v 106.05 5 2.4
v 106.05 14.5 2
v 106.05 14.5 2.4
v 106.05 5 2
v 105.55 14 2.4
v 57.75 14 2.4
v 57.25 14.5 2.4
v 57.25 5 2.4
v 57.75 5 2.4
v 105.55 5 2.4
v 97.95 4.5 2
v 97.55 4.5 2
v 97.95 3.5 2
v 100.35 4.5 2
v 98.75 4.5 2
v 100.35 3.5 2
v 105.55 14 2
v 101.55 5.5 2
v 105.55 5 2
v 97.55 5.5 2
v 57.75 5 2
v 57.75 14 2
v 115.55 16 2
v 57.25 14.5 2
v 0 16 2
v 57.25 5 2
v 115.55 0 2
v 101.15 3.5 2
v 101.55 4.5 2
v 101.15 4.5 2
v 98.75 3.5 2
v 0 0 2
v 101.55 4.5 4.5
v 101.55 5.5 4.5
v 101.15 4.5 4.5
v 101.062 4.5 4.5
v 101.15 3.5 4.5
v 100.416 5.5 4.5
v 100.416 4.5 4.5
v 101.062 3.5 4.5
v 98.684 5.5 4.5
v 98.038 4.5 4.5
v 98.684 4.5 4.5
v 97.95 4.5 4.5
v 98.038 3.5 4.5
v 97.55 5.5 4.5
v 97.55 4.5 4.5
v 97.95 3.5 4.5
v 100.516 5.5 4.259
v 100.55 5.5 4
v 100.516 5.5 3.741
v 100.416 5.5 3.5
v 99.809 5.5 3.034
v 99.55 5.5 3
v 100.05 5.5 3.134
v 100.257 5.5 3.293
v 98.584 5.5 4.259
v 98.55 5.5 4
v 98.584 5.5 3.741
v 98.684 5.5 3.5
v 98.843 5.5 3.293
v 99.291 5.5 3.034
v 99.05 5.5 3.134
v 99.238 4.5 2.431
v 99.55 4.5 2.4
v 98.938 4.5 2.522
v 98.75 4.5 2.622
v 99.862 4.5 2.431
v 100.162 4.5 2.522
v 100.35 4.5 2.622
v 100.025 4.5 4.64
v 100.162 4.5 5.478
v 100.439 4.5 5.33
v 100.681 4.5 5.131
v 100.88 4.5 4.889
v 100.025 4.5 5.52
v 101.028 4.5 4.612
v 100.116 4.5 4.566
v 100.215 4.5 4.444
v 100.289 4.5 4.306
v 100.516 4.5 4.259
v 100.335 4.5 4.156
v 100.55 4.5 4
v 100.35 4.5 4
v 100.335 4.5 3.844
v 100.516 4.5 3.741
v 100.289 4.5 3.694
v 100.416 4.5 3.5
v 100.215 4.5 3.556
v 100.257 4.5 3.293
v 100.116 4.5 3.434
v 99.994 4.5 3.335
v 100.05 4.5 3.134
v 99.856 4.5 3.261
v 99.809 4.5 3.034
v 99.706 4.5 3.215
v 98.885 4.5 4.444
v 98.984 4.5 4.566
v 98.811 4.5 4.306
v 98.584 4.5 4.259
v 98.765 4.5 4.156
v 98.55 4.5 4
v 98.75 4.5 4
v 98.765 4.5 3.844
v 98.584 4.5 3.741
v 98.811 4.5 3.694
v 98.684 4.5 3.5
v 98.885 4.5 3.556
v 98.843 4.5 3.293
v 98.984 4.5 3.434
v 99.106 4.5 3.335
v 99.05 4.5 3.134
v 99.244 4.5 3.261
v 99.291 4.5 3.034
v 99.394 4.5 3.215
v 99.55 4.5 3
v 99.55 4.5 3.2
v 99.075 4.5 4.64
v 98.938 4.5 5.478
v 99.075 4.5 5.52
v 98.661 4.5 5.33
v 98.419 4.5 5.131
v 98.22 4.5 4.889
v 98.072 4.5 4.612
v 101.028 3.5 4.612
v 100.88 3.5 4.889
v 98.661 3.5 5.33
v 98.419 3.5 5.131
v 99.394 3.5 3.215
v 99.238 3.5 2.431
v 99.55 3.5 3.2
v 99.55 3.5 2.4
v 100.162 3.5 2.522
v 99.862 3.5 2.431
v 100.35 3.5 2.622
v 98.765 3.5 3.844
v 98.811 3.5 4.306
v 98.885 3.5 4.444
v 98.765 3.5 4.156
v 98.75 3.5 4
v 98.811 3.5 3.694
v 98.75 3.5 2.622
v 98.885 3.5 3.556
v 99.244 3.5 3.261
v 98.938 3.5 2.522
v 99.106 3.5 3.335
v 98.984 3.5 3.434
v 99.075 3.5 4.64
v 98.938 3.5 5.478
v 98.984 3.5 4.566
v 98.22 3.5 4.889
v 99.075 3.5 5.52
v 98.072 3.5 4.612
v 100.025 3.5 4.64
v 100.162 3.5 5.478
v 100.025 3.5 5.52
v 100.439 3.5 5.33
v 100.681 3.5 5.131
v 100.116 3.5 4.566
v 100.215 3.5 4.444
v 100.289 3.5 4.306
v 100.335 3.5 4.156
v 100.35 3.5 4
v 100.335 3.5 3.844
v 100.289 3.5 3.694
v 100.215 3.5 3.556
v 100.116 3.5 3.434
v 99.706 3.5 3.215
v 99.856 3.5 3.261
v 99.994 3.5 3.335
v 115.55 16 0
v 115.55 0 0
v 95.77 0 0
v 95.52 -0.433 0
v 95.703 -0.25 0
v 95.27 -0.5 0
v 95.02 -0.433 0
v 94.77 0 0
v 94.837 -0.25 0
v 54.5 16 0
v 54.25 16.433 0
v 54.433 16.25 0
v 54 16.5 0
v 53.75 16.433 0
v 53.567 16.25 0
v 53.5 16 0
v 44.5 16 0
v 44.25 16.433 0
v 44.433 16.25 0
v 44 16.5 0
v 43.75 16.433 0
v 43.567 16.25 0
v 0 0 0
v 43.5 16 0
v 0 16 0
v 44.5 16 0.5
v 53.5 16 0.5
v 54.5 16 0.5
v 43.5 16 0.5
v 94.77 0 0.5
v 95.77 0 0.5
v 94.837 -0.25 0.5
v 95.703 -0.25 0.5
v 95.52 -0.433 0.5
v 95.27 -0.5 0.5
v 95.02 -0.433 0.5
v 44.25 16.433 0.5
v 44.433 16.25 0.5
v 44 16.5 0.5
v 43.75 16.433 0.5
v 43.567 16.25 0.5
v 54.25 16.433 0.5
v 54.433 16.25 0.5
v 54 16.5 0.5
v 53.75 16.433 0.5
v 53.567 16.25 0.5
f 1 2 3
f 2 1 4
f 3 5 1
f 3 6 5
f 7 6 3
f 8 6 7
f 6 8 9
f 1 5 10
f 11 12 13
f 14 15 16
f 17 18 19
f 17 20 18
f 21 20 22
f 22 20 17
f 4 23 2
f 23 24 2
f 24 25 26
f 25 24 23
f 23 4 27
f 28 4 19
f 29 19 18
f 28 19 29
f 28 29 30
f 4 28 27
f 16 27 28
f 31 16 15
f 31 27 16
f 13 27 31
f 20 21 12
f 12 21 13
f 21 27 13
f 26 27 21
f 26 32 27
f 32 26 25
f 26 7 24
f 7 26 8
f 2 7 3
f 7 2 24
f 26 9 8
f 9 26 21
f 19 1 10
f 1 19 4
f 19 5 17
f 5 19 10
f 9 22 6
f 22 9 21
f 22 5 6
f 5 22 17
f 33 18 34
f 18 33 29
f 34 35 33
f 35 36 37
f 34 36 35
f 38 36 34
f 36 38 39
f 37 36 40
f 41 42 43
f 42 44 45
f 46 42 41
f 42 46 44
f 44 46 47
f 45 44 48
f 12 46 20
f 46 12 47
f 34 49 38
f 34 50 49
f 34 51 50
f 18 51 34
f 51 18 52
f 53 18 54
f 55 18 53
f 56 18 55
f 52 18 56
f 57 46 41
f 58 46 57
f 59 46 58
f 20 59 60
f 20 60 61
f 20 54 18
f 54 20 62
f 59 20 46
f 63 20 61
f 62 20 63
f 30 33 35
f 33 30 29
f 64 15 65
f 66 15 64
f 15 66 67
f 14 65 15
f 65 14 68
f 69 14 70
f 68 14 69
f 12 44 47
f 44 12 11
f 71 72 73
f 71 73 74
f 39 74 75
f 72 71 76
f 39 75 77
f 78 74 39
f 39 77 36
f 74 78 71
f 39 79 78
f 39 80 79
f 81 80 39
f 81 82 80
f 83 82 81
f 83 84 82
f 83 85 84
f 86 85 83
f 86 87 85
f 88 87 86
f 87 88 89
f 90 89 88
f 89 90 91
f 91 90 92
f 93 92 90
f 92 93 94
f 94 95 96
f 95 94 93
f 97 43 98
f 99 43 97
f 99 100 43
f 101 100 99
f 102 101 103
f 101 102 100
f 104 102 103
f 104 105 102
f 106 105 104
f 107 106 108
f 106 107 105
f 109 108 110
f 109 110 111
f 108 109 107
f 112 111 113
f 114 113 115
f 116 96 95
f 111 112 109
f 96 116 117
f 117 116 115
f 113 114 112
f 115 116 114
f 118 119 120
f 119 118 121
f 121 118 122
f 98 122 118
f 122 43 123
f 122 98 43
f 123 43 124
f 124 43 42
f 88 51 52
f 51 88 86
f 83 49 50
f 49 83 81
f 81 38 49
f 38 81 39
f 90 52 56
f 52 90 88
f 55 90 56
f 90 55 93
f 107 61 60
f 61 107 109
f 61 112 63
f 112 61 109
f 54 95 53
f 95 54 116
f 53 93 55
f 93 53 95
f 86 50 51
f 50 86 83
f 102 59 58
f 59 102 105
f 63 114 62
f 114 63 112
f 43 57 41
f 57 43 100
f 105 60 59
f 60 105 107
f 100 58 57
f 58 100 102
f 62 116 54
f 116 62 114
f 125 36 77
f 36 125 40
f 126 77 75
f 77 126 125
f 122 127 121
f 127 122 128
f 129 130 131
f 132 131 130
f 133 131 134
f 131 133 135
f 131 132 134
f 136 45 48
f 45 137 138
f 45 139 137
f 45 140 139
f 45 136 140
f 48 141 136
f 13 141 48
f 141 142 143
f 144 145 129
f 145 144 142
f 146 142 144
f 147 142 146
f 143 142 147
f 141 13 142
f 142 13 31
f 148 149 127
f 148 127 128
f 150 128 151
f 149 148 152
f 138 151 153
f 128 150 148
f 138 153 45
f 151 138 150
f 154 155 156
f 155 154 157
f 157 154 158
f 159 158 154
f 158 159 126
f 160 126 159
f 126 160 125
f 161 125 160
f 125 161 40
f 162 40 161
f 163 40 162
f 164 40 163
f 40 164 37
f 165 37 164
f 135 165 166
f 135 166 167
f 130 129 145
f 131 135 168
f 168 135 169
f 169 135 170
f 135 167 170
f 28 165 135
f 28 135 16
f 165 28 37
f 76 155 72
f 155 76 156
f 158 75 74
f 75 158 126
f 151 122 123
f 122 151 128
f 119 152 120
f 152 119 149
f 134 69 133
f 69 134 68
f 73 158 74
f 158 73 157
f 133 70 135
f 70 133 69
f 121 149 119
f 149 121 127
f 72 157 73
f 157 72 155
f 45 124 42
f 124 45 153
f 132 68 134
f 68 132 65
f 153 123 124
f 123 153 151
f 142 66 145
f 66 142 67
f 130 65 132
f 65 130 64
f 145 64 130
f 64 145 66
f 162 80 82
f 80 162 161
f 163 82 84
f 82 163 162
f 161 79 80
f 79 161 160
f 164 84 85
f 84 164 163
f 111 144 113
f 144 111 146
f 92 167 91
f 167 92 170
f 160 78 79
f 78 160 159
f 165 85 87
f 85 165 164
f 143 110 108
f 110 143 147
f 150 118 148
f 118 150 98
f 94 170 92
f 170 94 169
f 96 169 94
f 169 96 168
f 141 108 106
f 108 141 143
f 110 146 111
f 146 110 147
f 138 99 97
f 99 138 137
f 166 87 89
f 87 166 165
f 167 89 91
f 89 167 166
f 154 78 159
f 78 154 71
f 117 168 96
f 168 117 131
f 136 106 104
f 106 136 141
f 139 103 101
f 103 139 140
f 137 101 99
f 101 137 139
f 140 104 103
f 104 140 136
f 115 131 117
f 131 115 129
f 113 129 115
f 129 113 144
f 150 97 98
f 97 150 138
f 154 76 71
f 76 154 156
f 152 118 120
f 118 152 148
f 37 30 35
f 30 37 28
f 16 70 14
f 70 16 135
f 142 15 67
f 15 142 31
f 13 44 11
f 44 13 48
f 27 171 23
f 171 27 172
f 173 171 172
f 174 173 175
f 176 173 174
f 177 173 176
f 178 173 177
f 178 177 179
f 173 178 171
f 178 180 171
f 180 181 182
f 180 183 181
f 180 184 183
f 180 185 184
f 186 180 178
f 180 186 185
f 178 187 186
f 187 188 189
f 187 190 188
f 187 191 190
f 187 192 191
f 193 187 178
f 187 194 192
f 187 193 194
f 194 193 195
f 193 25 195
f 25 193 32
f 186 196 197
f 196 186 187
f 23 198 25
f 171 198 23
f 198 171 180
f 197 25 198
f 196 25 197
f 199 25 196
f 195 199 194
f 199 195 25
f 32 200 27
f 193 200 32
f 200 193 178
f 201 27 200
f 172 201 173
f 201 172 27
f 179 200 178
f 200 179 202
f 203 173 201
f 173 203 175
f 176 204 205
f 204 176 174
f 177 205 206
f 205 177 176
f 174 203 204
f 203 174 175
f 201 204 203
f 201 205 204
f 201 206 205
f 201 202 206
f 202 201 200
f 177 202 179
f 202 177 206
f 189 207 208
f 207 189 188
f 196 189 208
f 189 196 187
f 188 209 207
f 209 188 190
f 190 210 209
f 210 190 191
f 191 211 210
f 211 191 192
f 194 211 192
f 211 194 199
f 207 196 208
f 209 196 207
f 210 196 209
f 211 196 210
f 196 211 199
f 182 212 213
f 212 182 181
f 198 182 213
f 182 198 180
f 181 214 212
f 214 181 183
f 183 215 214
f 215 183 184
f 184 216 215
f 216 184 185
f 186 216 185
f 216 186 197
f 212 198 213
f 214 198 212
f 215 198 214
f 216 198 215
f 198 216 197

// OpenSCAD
// Internal mount for the adhesive U.FL 2.4GHz antenna (pilink-8hx.4).
//
// NOT RENDERED/FIT-CHECKED. OpenSCAD is not installed in the environment
// this file was authored (and later fixed) in (see README.md and
// AGENTS.md "This repo has no build/test automation") -- every dimension
// below is transcribed from a cited source or marked as this file's own
// assumption. A human with OpenSCAD (or a later pass with it installed)
// still needs to actually render this and check it against the real
// back-shell geometry from pilink-8hx.1, once that lands.
//
// Scope: this file models only the antenna mount feature itself (a flat
// adhesive-land + retention lip + cable strain relief + a reference cable
// channel), not a full top-wall shell. pilink-8hx.1 (back shell) and
// pilink-8hx.2 (front shell) are being built in parallel on separate
// branches and own the real top-wall geometry; antenna_mount() is meant to
// be instantiated (translated/rotated onto the real wall) from whichever of
// those ends up owning the top wall's inner surface. demo_assembly() below
// is a self-contained preview only -- its "stand-in top wall" slab is NOT
// the real enclosure wall and must not be unioned into either shell.
//
// Revision history: a code-reviewer's NOT APPROVED verdict on PR #48
// (2bdfd6a) found the first version's left-wall-hugging position put the
// antenna element physically inside the SW101 top-edge pinhole's channel
// (a real 3D collision, not just a flagged cross-bead conflict), never
// checked the display-panel/ground-plane clearance it claimed to derive,
// and had three geometry bugs (lip closed on the wrong side, the cable
// channel modeled as a solid bar instead of an actual cutout, and the
// strain-relief clip coming out U-shaped instead of C-shaped). That
// revision (9eac09f) re-derived the position (see "Mount position" below)
// and fixed those three bugs, but a second NOT APPROVED round found: the
// display/ground clearance discussion was framed on the wrong axis (a
// non-existent "Z gap" instead of the real face-Y distance) and wrongly
// called "not derivable" when it is derivable and fails the guidance; the
// land/lip/channel/clip stack was modeled ~19mm deep against a ~10mm
// available wall cavity; the strain-relief clip's bore ran wall-normal
// instead of along the cable's actual path; the cable-channel-width
// comment claimed margin for the IPEX plug body that doesn't mate here at
// all (it mates at U201, far from this stub); and a stated clearance
// figure had an arithmetic slip (39mm instead of 38.25mm). This revision
// fixes all of those -- see the comments at each fix below and
// `.planning` bead `pilink-58z` for the RF-clearance trade-off this file
// now surfaces instead of hiding.
//
// A third NOT APPROVED round (47e528d) found the strain-relief clip, as
// built after round 2, couldn't actually hold the cable: its snap-in slot
// (1.43mm) was wider than the 1.13mm coax it was meant to grip; its wall
// thickness was silently tied to LIP_WIDTH and had been thinned to 0.5mm
// along with it; it floated 0.7mm off the wall surface with no real
// support; and its slot opened sideways (-X) while the channel's own
// groove opens upward (+Z), a kink in the cable's path. This revision
// gives the slot its own under-the-coax width, gives the clip its own
// independent wall-thickness constant, adds support legs down to the
// wall surface, and reorients the slot to open the same way as the
// groove -- see strain_relief_clip() and the legs added just after its
// call site below. That round also found this file's own README wording
// overstated the ~46mm clearance figure's source as "the antenna
// datasheet's own guidance" -- fixed in README.md to match what this
// file already said (general adhesive-FPC-antenna practice, not a
// datasheet figure).

// pilink-3ym (2026-11-16) REVISION -- supersedes pilink-adt / closed PR #54.
// pilink-hdl (PR #60) moved U201 to the BACK of the board (B.Cu) and
// restored the A/B/X/Y diamond to centre (102,25). Consequences handled
// here: (1) U201 is no longer on the front, so it is not "under the mount";
// its U.FL faces the back shell and the pigtail runs behind the PCB, over
// the board's top edge, into this mount (route + length derived below);
// (2) the pigtail exit moved from the land's left end to its right end,
// nearest the back-side U.FL (face X ~101); (3) the stale diamond
// coordinates are gone (this file never used the diamond; the old
// pilink-2yw (102,34) figures only survive in history notes); (4) the
// board-to-face Y mapping now matches the shells' Qface = 52 - by (the old
// 6mm bottom-flush assumption was wrong by 2mm, which made the RF
// clearance numbers 2mm too generous). The antenna ELEMENT/mount X span
// (57.75-105.55) did not move, so pilink-58z's numbers only change through
// that mapping correction (4->2mm to the board top edge, 9->7mm to the
// panel frame), not through the PCB change. Still NOT rendered.

// ---------------------------------------------------------------------------
// Antenna part -- Kinghelm KH-FPC2.4G-1.13IPEX-240, LCSC C4943394. Selected
// (over the AIWF026 alternate) in
// .research/findings/2026-11-15-ufl-antenna-selection.md and closed out in
// bd pilink-8wx ("primary Kinghelm KH-FPC2.4G-1.13IPEX-240, alternate
// MyAntenna AIWF026 flagged as fractionally over cert-safe gain ceiling").
// ---------------------------------------------------------------------------

// Element footprint, confirmed directly on LCSC's C4943394 product page
// (packaging field "SMD, 45.8x6.5mm") per the research finding.
ANTENNA_ELEMENT_LENGTH = 45.8;   // mm, long axis
ANTENNA_ELEMENT_WIDTH  = 6.5;    // mm

// Element thickness is NOT given anywhere in the finding or on the LCSC
// listing -- this is this file's own nominal placeholder for a thin
// adhesive-backed FPC, used only so the 3D preview has a visible element;
// it is not a verified dimension and should not drive any clearance math.
ANTENNA_ELEMENT_THICKNESS_NOMINAL = 0.3; // mm, UNVERIFIED placeholder

// Pigtail: Ø1.13mm coax, IPEX/U.FL-class plug. The "-240" part-number
// suffix implies a 240mm cable but the finding is explicit this is
// INFERRED from the part number, not a confirmed datasheet/listing field
// -- confirm before ordering. Not used for any geometry below beyond the
// cable-channel's nominal width.
ANTENNA_CABLE_DIAMETER = 1.13; // mm

// Clearance guidance (.research/findings/2026-11-15-ufl-antenna-selection.md,
// "Clearance / ground-plane guidance"): the 32UE's own datasheet carries no
// keepout for an external antenna (that keepout only applied to the
// on-module antenna variant). The finding instead cites general adhesive-FPC
// practice: "keep the flexible element itself clear of metal/ground
// plane/battery within roughly its own element length on the radiating
// side". Modeled here as a single symmetric reference zone equal to the
// element's own length -- a simplification of what the source guidance
// describes as one-sided/radiating-direction-specific, since neither the
// finding nor any datasheet in this repo states which end of this specific
// part radiates. Shown with `%` (OpenSCAD non-manifold preview modifier) so
// it never affects a boolean/union result -- it is a visual "keep metal
// clear of this" marker for a human reviewing the render, not a solid.
ANTENNA_KEEPOUT_FROM_METAL = ANTENNA_ELEMENT_LENGTH; // mm, see note above

// ---------------------------------------------------------------------------
// Board / face coordinate assumptions.
//
// hardware/README.md "PCB layout (pilink-7el.12, upright desk-clock form
// factor)" gives the real 118 x 50mm board's placement table in board-local
// mm (origin top-left, x right, y down). The mapping onto the ~122 x 56mm
// face is SETTLED (pilink-8hx.2 / pilink-3ym; shared with back_shell.scad's
// board_to_face() and front_shell.scad's board_to_y()):
//   - face_x = board_x + 2 (board centered left-right: (FACE_W-BOARD_W)/2)
//   - Qface = 52 - board_y (2mm wall + 2mm TOP_SLACK above the board's
//     top edge; the board is NOT bottom-flush)
// X is the one axis that matters for this file: left-right position is
// unaffected by the body's 15-degree lean, so board-local X and face-local
// X are directly comparable to pilink-8hx.2's SW101/SW102 pinhole X values
// via this same offset.
// ---------------------------------------------------------------------------

BOARD_W = 118.0; // mm, hardware/README.md
BOARD_H = 50.0;  // mm, hardware/README.md
FACE_W  = 122.0; // mm, .planning/decisions/2026-11-15-upright-desk-clock-form-factor.md ("Face about 122 W x 56 H mm")
FACE_H  = 56.0;  // mm, same ADR

BOARD_TO_FACE_X_OFFSET = (FACE_W - BOARD_W) / 2; // = 2.0mm

// pilink-3ym: the Y mapping is no longer the "bottom-flush,
// 6mm above" assumption this file inherited from hardware/README.md. Both
// shells (back_shell.scad board_to_face(), front_shell.scad board_to_y())
// settled on Qface = 52 - board_y (2mm wall + 2mm TOP_SLACK above the
// board), so the board's top edge (board y=0) is at Qface 52, i.e. 4mm
// below the face's top outer edge (Q 56), NOT 6mm. The top wall's INNER
// surface (where this mount sits) is at Qface 54. Y distances below use
// this mapping; the old 6mm figure overstated every clearance by 2mm.
WALL_THICKNESS_FACE = 2.0;                                // = back/front shell WALL_T/WALL
BOARD_TOP_EDGE_Q = FACE_H - WALL_THICKNESS_FACE - 2.0;    // = 52, board y=0 (TOP_SLACK 2.0)
function board_to_q(by) = BOARD_TOP_EDGE_Q - by;
// Kept (derived, = 4.0mm) so the older "face-Y below the face top" wording
// still reads: distance from the face's top outer edge down to the board's top edge.
BOARD_TO_FACE_Y_OFFSET = FACE_H - BOARD_TOP_EDGE_Q;

// U201 (ESP32-WROOM-32UE) -- pilink-3ym REWRITE. U201 is on the BACK of
// the board (B.Cu, pilink-hdl / PR #60) at board (99, 11.6); the old
// "antenna edge X ~= 5-23, centred 14" figure (ADR pilink-5g8, a front-side
// upper-left U201) and the pilink-2yw "above the diamond" figure are both
// stale. U201 is therefore NOT under the mount on the front any more: it
// is behind the PCB, in the back shell's 3.0mm cavity with its own relief
// pocket (back_shell.scad u201_relief_pocket()). Antenna-end edge = module
// body y 2.0 (F.Fab, measured off hardware/pico-link-hw.kicad_pcb).
// The U.FL receptacle position is not in the KiCad footprint. VERIFIED
// (pilink-bl2) from Espressif's ESP32-WROOM-32E/32UE datasheet v2.1,
// Figure 11 (32UE top view): receptacle centre 3.07mm in from the
// antenna-end edge and 3.27mm in from the long edge on the pin 25-38 side
// -- i.e. in the corner beside the antenna notch, NOT centred in X (the
// old assumption was x=99, 5.73mm off). On the B.Cu module (pad 38 at
// board x 90.25, antenna end at y 2.0): X = 90.0 + 3.27 = 93.27,
// Y = 2.0 + 3.07 = 5.07. Receptacle body 2.6 x 2.6mm, 1.25+-0.15mm tall
// (Figure 12). Mated plug cable-exit direction is NOT fixed by the
// receptacle (round socket); it is chosen at assembly.
U201_UFL_BOARD_X = 93.27;  // verified, datasheet Fig. 11
U201_UFL_BOARD_Y = 5.07;   // verified, datasheet Fig. 11
U201_ANTENNA_FACE_X_CENTER = U201_UFL_BOARD_X + BOARD_TO_FACE_X_OFFSET; // 95.27mm
U201_UFL_Q = board_to_q(U201_UFL_BOARD_Y);                              // Qface ~46.9

// SW101/SW102 (BOOTSEL/RESET) top-edge pinhole X positions, board-local,
// from hardware/README.md's placement table: "SW101 (42, 2.7), SW102
// (52, 2.7) -- in the 5mm strip above the panel". This is pilink-8hx.2's
// own geometry (front shell, top-edge pinhole channels) -- NOT duplicated
// here, only read for the position/collision check below.
SW101_X_BOARD_LOCAL = 42.0;
SW102_X_BOARD_LOCAL = 52.0;
SW101_X_FACE_LOCAL = SW101_X_BOARD_LOCAL + BOARD_TO_FACE_X_OFFSET; // 44.0mm
SW102_X_FACE_LOCAL = SW102_X_BOARD_LOCAL + BOARD_TO_FACE_X_OFFSET; // 54.0mm

// Pinhole diameter, from the ADR's own wording: "pressed straight down
// through about a 1.5 mm pinhole". Same channel is shared by both
// SW101/SW102 per that same ADR passage.
PINHOLE_DIAMETER = 1.5; // mm, ADR (upright-desk-clock-form-factor.md)

// Display-panel shadow, board-local, from hardware/README.md:971 ("Treated
// as x:[28,87] y:[5,47] on the board"). Converted to face-local X using the
// same offset as everything else in this file. Only the X range is used
// below (see "Display-panel / ground-plane clearance check" note further
// down for why Y/Z aren't checked here).
PANEL_X_MIN_BOARD_LOCAL = 28.0; // mm, hardware/README.md:971
PANEL_X_MAX_BOARD_LOCAL = 87.0; // mm, hardware/README.md:971
PANEL_X_MIN_FACE_LOCAL = PANEL_X_MIN_BOARD_LOCAL + BOARD_TO_FACE_X_OFFSET; // 30.0mm
PANEL_X_MAX_FACE_LOCAL = PANEL_X_MAX_BOARD_LOCAL + BOARD_TO_FACE_X_OFFSET; // 89.0mm

// ---------------------------------------------------------------------------
// This file's own choices (not sourced from any ADR/finding -- stated so a
// reviewer knows exactly which numbers are mine to argue with).
// ---------------------------------------------------------------------------

ASSEMBLY_CLEARANCE = 1.0;     // mm, margin added around the element footprint so an installer can place the adhesive antenna by eye, not a datasheet figure
WALL_THICKNESS = 2.0;         // mm, nominal FDM shell wall -- pilink-8hx.1 may land on a different value; parameterized so it's a one-line change here
PINHOLE_X_CLEARANCE = 3.0;    // mm, this file's own minimum-margin choice from a pinhole's edge to the mount's land edge (same figure the first version used for the left-wall margin, kept consistent rather than tuned differently just because the position moved)
// *** FIX for PR #48 review item (mount depth vs. available wall depth) ***
// LIP_WIDTH is reduced from 0.8 to 0.5mm here as part of that fix -- see
// the "Mount depth" note below the land-footprint constants for the full
// depth accounting.
LIP_WIDTH = 0.5;              // mm, width of the raised locating lip around the land
LIP_HEIGHT = 0.4;             // mm, height of the raised locating lip
// *** FIX for PR #48 review item (groove width vs. IPEX plug body) ***
// This channel/groove only carries the bare Ø1.13mm coax between the
// antenna land and the cavity -- the IPEX/U.FL-class male plug is on the
// OTHER end of the pigtail, where it mates at U201 (see
// `strain_relief_clip()`'s own comment and the finding), nowhere near this
// stub. So "margin for the plug body" was simply wrong; corrected below.
CABLE_CHANNEL_WIDTH = 2.0;    // mm, clear of ANTENNA_CABLE_DIAMETER (1.13mm) with margin for the bare coax only (no plug passes through this stub)
CABLE_CHANNEL_DEPTH = 1.5;    // mm, depth of the groove cut into the channel boss (see channel() below)
CHANNEL_BOSS_MARGIN = 1.0;    // mm, solid shoulder left on each side of the groove so there is material to actually cut the groove into
CABLE_CHANNEL_EXIT_X_INSET = 6.0; // mm, now measured from the land's RIGHT (+X) end -- pilink-3ym: U201's U.FL (x~101) is near that end, no longer near the old left end. UNSOURCED ASSUMPTION: neither the research finding nor the LCSC listing says where this part's actual pigtail leaves the element (flagged in both places). This file picks an exit point inset from the land's edge nearest U201 (see "Mount position" below for why that edge is nearest), on the assumption that the shortest practical cable run to U201's U.FL connector is the right default absent a real drawing -- not a confirmed exit point on the physical part.
STRAIN_RELIEF_CLIP_ID = 1.6;  // mm, snug over the 1.13mm coax
// Reduced from 2.0 to 1.0mm as part of the mount-depth fix below -- still
// enough ring thickness along the cable's own axis (after the bore-
// orientation fix, see strain_relief_clip() below) for a printed C-clip to
// grip a cable this thin (Ø1.13mm), just not generously so.
STRAIN_RELIEF_CLIP_HEIGHT = 1.0; // mm
// *** FIX for PR #48 review round 3 (blocking, "clip can't actually hold
// the cable") ***
// This was ANTENNA_CABLE_DIAMETER + 0.3 = 1.43mm -- WIDER than the 1.13mm
// coax, so the cable dropped straight through with no snap at all
// (contradicts the "press through / snap over and hold" comments below).
// A snap-fit slot has to be narrower than the thing it grips so the
// printed plastic has to flex open to let the cable in and spring back
// after; sized here a little under the coax diameter rather than a little
// over it.
STRAIN_RELIEF_CLIP_SLOT_WIDTH = 0.95; // mm, narrow snap-in slot, deliberately UNDER the 1.13mm coax diameter so the ring has to flex open to admit the cable and then grip it, not the full half-ring opening the first version cut (which left a U, not a C -- see PR review item 8)
// *** FIX for PR #48 review round 3 (blocking, "wall thickness silently
// cut via LIP_WIDTH coupling") ***
// The clip ring's own wall used to be computed as `clip_id + 2*lip_width`,
// so cutting LIP_WIDTH (mount lip, a completely different part of the
// model) from 0.8 to 0.5mm in the previous round silently thinned the
// clip's wall too, down to 0.5mm -- about one 0.4mm-nozzle extrusion
// width. Given its own constant here instead, independent of LIP_WIDTH.
STRAIN_RELIEF_CLIP_WALL = 0.8; // mm, clip ring's own radial wall thickness -- independent of LIP_WIDTH (different part of the model), kept at a minimum of 0.8mm so it actually has grip strength when printed

// Land (adhesive mounting area) footprint, element + clearance on all sides.
MOUNT_LAND_LENGTH = ANTENNA_ELEMENT_LENGTH + 2 * ASSEMBLY_CLEARANCE; // 47.8mm
MOUNT_LAND_WIDTH  = ANTENNA_ELEMENT_WIDTH + 2 * ASSEMBLY_CLEARANCE;  // 8.5mm

// *** FIX for PR #48 review item (mount depth vs. available wall depth,
// blocking) ***
// The review measured this mount's own Y-footprint (land + lip on the
// closed +Y edge, plus the channel stub + clip on the open -Y/cable-exit
// edge) at about 19mm, against a top-wall inner cavity depth of only about
// 10mm (ADR: body ~14mm thick, minus ~2mm front/back walls each). That
// axis (this file's local Y) maps to the body's front-to-back depth, not
// to the wall's own thickness, so it is a real fit problem independent of
// the RF-clearance question above, and it doesn't resolve itself just by
// repositioning the mount in X.
//
// With LIP_WIDTH and STRAIN_RELIEF_CLIP_HEIGHT reduced above and a much
// shorter default channel_length (see antenna_mount()'s signature below,
// 1.0mm instead of 8.0mm -- it was always documented as a placeholder
// stub, "real length depends on pilink-8hx.1's cavity geometry", not a
// committed dimension):
//   land + lip (+Y, closed edge):      MOUNT_LAND_WIDTH + LIP_WIDTH = 8.5 + 0.5 = 9.0mm
//   channel stub (-Y, open edge):      1.0mm (new default, was 8.0mm)
//   strain-relief clip (-Y, beyond the channel): STRAIN_RELIEF_CLIP_HEIGHT = 1.0mm (new default, was 2.0mm)
//   total Y-span:                      9.0 + 1.0 + 1.0 = 11.0mm
// That is down from ~19mm to ~11mm, but still about 1mm (~10%) OVER the
// ~10mm estimated wall-cavity budget -- NOT fully resolved. The land+lip
// side alone (9.0mm) already consumes nearly the whole budget.
// *** FIX for PR #48 review round 3 (non-blocking nit): the previous
// wording here claimed the land's width was "not by a tunable default",
// which overstated things -- only the physical element (6.5mm) and
// LIP_WIDTH are fixed; ASSEMBLY_CLEARANCE (1.0mm per side here) IS this
// file's own tunable choice. Tightening it to 0.5mm on this width axis
// alone (keeping it at 1.0mm on the length axis, where it isn't the
// binding constraint) would land the stack at exactly the 10.0mm budget.
// Not taken in this round: that's a third independent margin to cut in
// the same PR (after LIP_WIDTH and the clip height/wall), and stacking
// more cuts on top of each other without pilink-8hx.1/.2's real cavity
// geometry to check the result against risks over-correcting. So there
// IS a small amount of slack left on this axis -- just not spent here.
// Squeezing the channel stub and clip any further would start
// compromising their function (a clip ring thinner than ~1mm along the
// cable axis, or a wall thinner than ~0.8mm, is unlikely to grip a cable
// reliably when printed). Stated plainly rather than silently forced to
// fit: this mount's depth is very tight against the estimated 10mm cavity
// and may need pilink-8hx.1/pilink-8hx.2's actual 3D wall geometry to
// either confirm a bit more than 10mm is really available, or to route
// the strain-relief clip off this straight-line axis entirely (e.g.
// letting the cable turn a corner into the cavity below rather than
// continuing straight back) once that geometry exists to design against.

// ---------------------------------------------------------------------------
// Mount position in the top wall's own local X (= face-local X, left-right,
// unaffected by the lean -- see coordinate note above).
//
// *** FIX for PR #48 review item 1/2 (critical, blocking) ***
// The first version hugged the left inner wall (face-local X 3-50.8mm,
// covering element X 4-49.8mm) to keep the cable run to U201 short. That
// put the element squarely across SW101's pinhole at face-local X=44 --
// SW101_X_FACE_LOCAL above. The review's own measurements at the time (top
// wall inner depth ~10mm: body ~14mm thick minus front/back walls;
// land+lip depth 9.3mm with the lip width this file used then -- since
// reduced to 9.0mm as part of the separate mount-depth fix below;
// PTS645-class actuator sits a few mm in front of the PCB plane)
// show this is a real 3D collision -- the pinhole's paperclip travels
// through the same shallow top-wall cavity the antenna land sits in, not
// just an X-coordinate overlap on paper. That fails this bead's own
// acceptance criterion ("doesn't collide with the top-edge pinholes")
// outright, and the review was correct that resolving it is this bead's
// job, not pilink-8hx.2's: SW101/SW102's X positions are fixed by the
// already-merged, already-placed-and-routed PCB (pilink-7el.12), not a
// free variable for the front shell to retune. The antenna position is
// this bead's own free variable.
//
// Fix: move the mount clear of BOTH pinholes, to the right of SW102 (the
// rightward option -- staying left of SW101 only leaves face-local X
// 2-40.25mm = 38.25mm (inner wall at WALL_THICKNESS=2 to SW101's pinhole
// edge at SW101_X_FACE_LOCAL - PINHOLE_DIAMETER/2 - PINHOLE_X_CLEARANCE =
// 44 - 0.75 - 3 = 40.25), less than the 45.8mm element, so it doesn't fit;
// checked directly here, not assumed -- a review round corrected this
// from a slightly-off "3-42mm = 39mm" to the figure above; the conclusion
// (it doesn't fit) is unchanged either way). Minimum clearance from SW102's pinhole edge
// (SW102_X_FACE_LOCAL +/- half PINHOLE_DIAMETER) to the land is
// PINHOLE_X_CLEARANCE, same margin figure the old left-wall placement used:
//   MOUNT_X_MIN = 54.0 + 1.5/2 + 3.0 = 57.75mm
//   MOUNT_X_MAX = 57.75 + 47.8   = 105.55mm
// Right-side margin to the assumed inner wall (FACE_W - WALL_THICKNESS =
// 120mm) is then 120 - 105.55 = 14.45mm -- comfortably clear, no further
// tuning needed on that side.
//
// Cable-run consequence (pilink-3ym REWRITE -- the pre-pilink-hdl text here
// described a ~48mm run from a front-side U201 at face X 16; that is stale).
// U201's U.FL is now on the BACK of the board, at face (95.27, Q ~46.9)
// (verified, see U201_UFL_* above). The pigtail exit stays 6mm in from the
// RIGHT end of the land (pilink-bl2 did not move it; the verified U.FL is
// 4.3mm further left than first assumed, which only lengthens the run):
//   exit face X = MOUNT_X_MIN + (MOUNT_LAND_LENGTH - 6) = 99.55mm
//   lateral run to the U.FL = |95.27 - 99.55| = 4.28mm
// Route (assembled, not modelled): plug -> along the back cavity toward the
// board's top edge (Q 47 -> 52, 5mm, inside back_shell.scad's U201 relief)
// -> over the board's top edge through the 2mm TOP_SLACK gap (Q 52 -> 54,
// 2mm) -> into the top-wall mount. Front-to-back travel from the cavity
// (bz ~2) to the mount's cable exit is bounded by the top-wall cavity
// depth (~10mm, see the mount-depth note above). Estimated pigtail needed:
//   5 + 2 + 10 + 4.28 ~= 21mm, call it ~30mm with bend radii/slack.
// The part's pigtail is ~240mm (inferred from the part number), so ~210mm
// of excess has to be stowed (coiled/looped) inside the enclosure.
// pilink-phg: it is wound on a printed spool in the back shell's cavity
// (back_shell.scad pigtail_spool(), board (73,18)), not in this mount. Clearances checked:
//   - SW101/SW102 pinholes (face X 44/54, Q ~49.3) vs the cable at X ~95-100:
//     >45mm apart.
//   - Restored A/B/X/Y diamond (courtyard board y 13.58-36.43, front side)
//     vs the cable at board y <= 5 on the back: 8.6mm in Y and on the
//     opposite board face.
//   - H2 mounting boss (face (114,46), boss r 3.5 -> X >= 110.5) vs a
//     cable at X 95.3-99.55: ~11mm.
echo(str("[pilink-3ym] Pigtail exit face X ", MOUNT_X_MIN + MOUNT_LAND_LENGTH - CABLE_CHANNEL_EXIT_X_INSET,
         "mm vs assumed back-side U.FL face X ", U201_ANTENNA_FACE_X_CENTER, "mm."));
PINHOLE_EDGE_CLEARANCE_X = SW102_X_FACE_LOCAL + PINHOLE_DIAMETER / 2 + PINHOLE_X_CLEARANCE;
MOUNT_X_MIN = PINHOLE_EDGE_CLEARANCE_X;                // 57.75mm
MOUNT_X_MAX = MOUNT_X_MIN + MOUNT_LAND_LENGTH;         // 105.55mm
MOUNT_X_CENTER = (MOUNT_X_MIN + MOUNT_X_MAX) / 2;

echo(str("[pilink-8hx.4] Mount X ", MOUNT_X_MIN, "-", MOUNT_X_MAX,
         "mm. SW101 pinhole X=", SW101_X_FACE_LOCAL, ", SW102 pinhole X=",
         SW102_X_FACE_LOCAL, " (+/-", PINHOLE_DIAMETER / 2,
         "mm radius each) -- both now clear of the mount by construction."));

// *** Display-panel / ground-plane clearance check (PR #48 review item 3,
// blocking) ***
// The review correctly pointed out the first version drew the clearance
// keepout (ANTENNA_KEEPOUT_FROM_METAL / antenna_keepout_reference() below)
// as a marker and never actually compared it with anything. Doing that
// comparison honestly, with real numbers:
//
//   Display-panel shadow, face-local X: PANEL_X_MIN_FACE_LOCAL..PANEL_X_MAX_FACE_LOCAL = 30-89mm.
//   New mount, face-local X:            MOUNT_X_MIN..MOUNT_X_MAX           = 57.75-105.55mm.
//   X-overlap: max(0, min(89,105.55) - max(30,57.75)) = 31.25mm.
//
// That overlap is NOT avoidable by sliding the mount further: the panel
// shadow alone spans 59mm of the face's 122mm width, and the only clear
// span to its right (past face-local X=89, before the assumed right inner
// wall at X=120) is ~31mm -- less than the 45.8mm element, the same reason
// a left-of-SW101 placement didn't fit either. So within the fixed
// footprint this enclosure already committed to (panel width + a 45.8mm
// element + pinholes that can't move), there is no X position that clears
// the panel's shadow entirely. That is a real, checked conclusion, not an
// assumption -- the file now says so instead of implying it was resolved.
//
// What this does NOT mean is a second instance of the SW101 pinhole bug.
// The display panel and its frame live on the FACE (the tilted front
// panel, mounted a measured 7.5mm forward of the PCB plane per the ADR's
// knob-clearance derivation); the antenna mount lives in the TOP WALL (the
// highest point of the body, per this bead's own description), a
// different structural layer above it, not sharing a channel the way the
// top-wall pinholes do. The guidance this bead is actually weighing is the
// research finding's RF-performance keepout ("keep the flexible element
// clear of metal/ground plane ... within roughly its own element length"),
// not a literal collision risk.
PANEL_OVERLAP_X_MIN = max(MOUNT_X_MIN, PANEL_X_MIN_FACE_LOCAL);
PANEL_OVERLAP_X_MAX = min(MOUNT_X_MAX, PANEL_X_MAX_FACE_LOCAL);
PANEL_OVERLAP_X = PANEL_OVERLAP_X_MAX > PANEL_OVERLAP_X_MIN ? PANEL_OVERLAP_X_MAX - PANEL_OVERLAP_X_MIN : 0;

echo(str("[pilink-8hx.4] Display-panel shadow X ", PANEL_X_MIN_FACE_LOCAL, "-",
         PANEL_X_MAX_FACE_LOCAL, "mm vs mount X ", MOUNT_X_MIN, "-", MOUNT_X_MAX,
         "mm: ", PANEL_OVERLAP_X,
         "mm of X-overlap, unavoidable given the fixed panel/pinhole footprint."));

// *** FIX for PR #48 review round 2 (critical, blocking): the governing
// number here is NOT a Z (perpendicular-to-face) gap -- a prior revision
// of this file wrongly framed it that way and called it "not derivable
// until pilink-8hx.1/.2 land". Both parts were wrong. The antenna sits in
// the top wall, ABOVE the board's top edge and the display panel's top
// edge, in the FACE PLANE (face-Y, the same axis FACE_H/BOARD_H already
// use) -- not in front of or behind them in Z. And that face-Y distance
// *is* derivable to first order from constants already in this file, using
// the settled board-to-face mapping (Qface = 52 - board_y, face_x =
// board_x + 2).
//
// Display-panel shadow Y start, board-local, from hardware/README.md:971
// ("Treated as x:[28,87] y:[5,47] on the board") -- only the X range was
// captured above; this is its Y start, needed for the face-Y estimate.
PANEL_Y_MIN_BOARD_LOCAL = 5.0; // mm, hardware/README.md:971
PANEL_Y_MIN_FACE_LOCAL = PANEL_Y_MIN_BOARD_LOCAL + BOARD_TO_FACE_Y_OFFSET; // 9.0mm below the face top edge (pilink-3ym: was 11.0 with the stale 6mm offset; = Qface 47)

// The element itself sits on the top wall's INNER surface, i.e.
// WALL_THICKNESS below the face's own top edge (face-y=0) -- an estimate,
// not a confirmed figure (the board-to-face mapping itself is settled).
ANTENNA_ELEMENT_FACE_Y_ESTIMATE = WALL_THICKNESS; // ~2.0mm below the face top edge (inner top-wall surface, Qface 54)

// Board's own top edge (where SW101/SW102's copper and the board outline
// itself sit) is at face-y = BOARD_TO_FACE_Y_OFFSET = 4.0mm (Qface 52; pilink-3ym, was 6.0).
CLEARANCE_TO_BOARD_TOP_EDGE_ESTIMATE = BOARD_TO_FACE_Y_OFFSET - ANTENNA_ELEMENT_FACE_Y_ESTIMATE; // 2.0mm (pilink-3ym: was ~4.0 under the stale 6mm offset)
// Panel frame's top edge is at face-y = PANEL_Y_MIN_FACE_LOCAL = 9.0mm (pilink-3ym, was 11.0).
CLEARANCE_TO_PANEL_FRAME_ESTIMATE = PANEL_Y_MIN_FACE_LOCAL - ANTENNA_ELEMENT_FACE_Y_ESTIMATE; // 7.0mm (pilink-3ym: was ~9.0)

// The guidance (ANTENNA_KEEPOUT_FROM_METAL, ~46mm -- roughly the element's
// own length) is measured against a face that is only FACE_H=56mm tall in
// total, with only ~9mm of that above the panel's own top edge (pilink-3ym:
// was ~11mm under the stale mapping). So this
// is not a marginal shortfall and not something a different X position in
// this same top wall can fix: EVERY top-wall position puts the element
// within single-digit mm of the board's top-edge copper and the panel
// frame, roughly 6-23x closer (46/7 ~= 6.6x to the panel frame, 46/2 =
// 23x to the board edge; pilink-3ym, corrected mapping -- was 5.1x/11.5x)
// than the ~46mm guidance asks for. That is a
// real RF-performance trade-off (reduced range/link reliability risk), not
// a modeling gap to leave open in an echo() addressed to a mechanical
// fit-check bead. It is now tracked as its own product decision in
// `pilink-58z` (P1, discovered-from this bead) -- see that bead for the
// options (accept + empirical range test, flip the element's radiating
// end, move to the rear wall, trim PCB copper near the top edge, or grow
// the enclosure). This file does not re-litigate those options or change
// the mount's X position for them; that call belongs to pilink-58z once
// Andreas decides.
echo(str("[pilink-8hx.4] Face-Y clearance (pilink-3ym: merged-shell board-to-face ",
         "mapping Qface=52-by): element at ",
         "face-y~", ANTENNA_ELEMENT_FACE_Y_ESTIMATE, "mm, board top edge at ",
         "face-y=", BOARD_TO_FACE_Y_OFFSET, "mm (~",
         CLEARANCE_TO_BOARD_TOP_EDGE_ESTIMATE, "mm clearance), panel frame top ",
         "at face-y=", PANEL_Y_MIN_FACE_LOCAL, "mm (~",
         CLEARANCE_TO_PANEL_FRAME_ESTIMATE, "mm clearance) -- vs the ",
         ANTENNA_KEEPOUT_FROM_METAL, "mm guidance. NOT MET at this or any ",
         "top-wall X position (face is only ", FACE_H, "mm tall, ~9mm of ",
         "it above the panel). Real RF trade-off, tracked in pilink-58z -- ",
         "not resolved here, not left pending."));

module antenna_element_reference() {
  // Non-manifold preview of the antenna element itself, for visual
  // reference only -- never unioned into a shell.
  %color("DarkOliveGreen")
    cube([ANTENNA_ELEMENT_LENGTH, ANTENNA_ELEMENT_WIDTH, ANTENNA_ELEMENT_THICKNESS_NOMINAL]);
}

module antenna_keepout_reference() {
  // Non-manifold preview of the "keep metal clear" zone from the finding's
  // clearance guidance (see ANTENNA_KEEPOUT_FROM_METAL above). Centered on
  // the element, inflated symmetrically in all directions as the
  // simplification noted above.
  k = ANTENNA_KEEPOUT_FROM_METAL;
  %color("Yellow", 0.15)
    translate([-( k - ANTENNA_ELEMENT_LENGTH) / 2, -(k - ANTENNA_ELEMENT_WIDTH) / 2, 0])
      cube([k, k, 0.1]);
}

// The mount itself: a locating lip (raised frame) around the land, plus a
// cable channel and strain-relief clip running toward -Y (i.e. toward
// wherever the integrating shell's cavity continues down to U201 -- this
// file does not know that path in 3D, since pilink-8hx.1's internal
// standoff/cavity geometry above the board's top edge doesn't exist yet;
// the channel below is a short straight stub to hand off to).
//
// Local frame: X = left-right (= face-local X), Y = into the top wall's own
// shallow depth (toward the cavity/cable exit), Z = wall-normal (thickness).
// Origin (0,0,0) is the land's own bottom-left-front corner on the wall's
// inner surface.
module antenna_mount(
  land_length = MOUNT_LAND_LENGTH,
  land_width = MOUNT_LAND_WIDTH,
  lip_width = LIP_WIDTH,
  lip_height = LIP_HEIGHT,
  channel_width = CABLE_CHANNEL_WIDTH,
  channel_depth = CABLE_CHANNEL_DEPTH,
  channel_length = 1.0, // mm, short stub -- reduced from 8.0mm as part of the mount-depth fix (see MOUNT_LAND_WIDTH's "Mount depth" note above); real length still depends on pilink-8hx.1's cavity geometry and is expected to be overridden once that exists
  channel_exit_x = MOUNT_LAND_LENGTH - CABLE_CHANNEL_EXIT_X_INSET, // pilink-3ym: land-local X of the pigtail exit, 6mm in from the right end (nearest U201's back-side U.FL)
  clip_id = STRAIN_RELIEF_CLIP_ID,
  clip_height = STRAIN_RELIEF_CLIP_HEIGHT
) {
  // Locating lip: a thin rectangular frame standing LIP_HEIGHT proud of the
  // wall's inner surface, outer edge at the land footprint, so an installer
  // seats the adhesive-backed element against its inside face. Left open on
  // the -Y edge (cable exit side).
  //
  // *** FIX for PR #48 review item 4 (blocking) ***
  // The first version's difference() left the lip material on -Y (closed)
  // and nothing on +Y (open) -- backwards from this comment and from the
  // cable channel's own -Y direction below, so the channel ran straight
  // into solid lip material instead of the claimed open side. Rebuilt as
  // an explicit picture-frame (outer ring minus the land's own interior)
  // with the -Y edge's lip strip removed afterward, so -Y is actually open
  // and the end caps + the +Y edge actually stay closed.
  module lip_frame() {
    difference() {
      // Outer ring: land footprint expanded by lip_width on all 4 sides.
      translate([-lip_width, -lip_width, 0])
        cube([land_length + 2 * lip_width, land_width + 2 * lip_width, lip_height]);

      // Remove the land's own interior, leaving only the ring.
      translate([0, 0, -0.1])
        cube([land_length, land_width, lip_height + 0.2]);

      // Open the -Y edge (cable-exit side) by removing that edge's own
      // strip of the ring too, leaving the two end caps and the +Y edge.
      translate([0, -lip_width - 0.1, -0.1])
        cube([land_length, lip_width + 0.2, lip_height + 0.2]);
    }
  }

  color("SlateGray") lip_frame();

  // Cable channel stub: a short solid boss running from the land's open
  // (-Y) edge toward the cavity, with an actual groove cut into its top
  // face for the coax to sit in.
  //
  // *** FIX for PR #48 review item 5 (blocking) ***
  // The first version unioned the rounded-rectangle hull shape in as a
  // solid 2mm rod -- nothing was ever subtracted, so there was no cavity
  // for a cable at all. This version builds a boss with enough material
  // (CHANNEL_BOSS_MARGIN shoulder on each side, channel_depth + 1mm under
  // the groove) to actually cut channel_width x channel_depth of groove
  // out of via difference(), open at the boss's top face.
  module channel() {
    boss_width = channel_width + 2 * CHANNEL_BOSS_MARGIN;
    boss_height = channel_depth + 1.0; // mm, 1mm of wall left under the groove, this file's own choice
    groove_z = boss_height - channel_depth + channel_width / 2;

    difference() {
      translate([channel_exit_x - boss_width / 2, -channel_length, 0])
        cube([boss_width, channel_length, boss_height]);

      // Groove: rounded cross-section (hull of two cylinders) sized for
      // the bare 1.13mm coax only -- the IPEX/U.FL-class plug is on the
      // pigtail's OTHER end, mating at U201, not here (see
      // CABLE_CHANNEL_WIDTH's own comment above) -- cut down channel_depth
      // from the boss's top face.
      hull() {
        translate([channel_exit_x, 0.01, groove_z])
          rotate([90, 0, 0])
            cylinder(h = 0.02, d = channel_width, $fn = 24);
        translate([channel_exit_x, -channel_length - 0.01, groove_z])
          rotate([90, 0, 0])
            cylinder(h = 0.02, d = channel_width, $fn = 24);
      }
    }
  }

  color("SlateGray") channel();

  // Height of the channel's groove axis, mirroring channel()'s own
  // groove_z (boss_height - channel_depth + channel_width/2, and
  // boss_height - channel_depth is always 1.0 by construction above) --
  // used below to line the clip's bore up with the groove's own height so
  // the cable continues at the same level, not stepped.
  channel_groove_z = 1.0 + channel_width / 2;

  // Strain-relief clip: a C-shaped boss just past the channel's far end so
  // the coax doesn't transmit pull-force to the U.FL plug on U201.
  //
  // *** FIX for PR #48 review item 8 (minor, fixed as low-cost) ***
  // The first version's cutout cube spanned a full half-plane across the
  // ring (clip_id + 2*lip_width wide, centered on the ring), which removed
  // more than half the ring -- a U, not a C, with nothing left to grip the
  // cable. This version cuts only a narrow slot (STRAIN_RELIEF_CLIP_SLOT_WIDTH,
  // sized off the coax diameter with a small press-fit margin) so the ring
  // stays mostly closed and can actually snap over and hold the coax.
  //
  // *** FIX for PR #48 review round 2 (clip bore orientation) ***
  // The previous revision's ring had its bore along Z (wall-normal) --
  // rotate([0,0,90]) at the call site only spins the ring about its own
  // (still-Z) axis, it doesn't change which axis the hole runs along. A
  // Z-axis bore only grips the coax if the cable turns 90 degrees toward
  // the wall right at this point, which isn't the cable's real path: the
  // coax runs straight along -Y through the channel groove and keeps
  // going in -Y from here toward the cavity (see antenna_mount()'s own
  // doc comment -- this file hands off a straight stub, it doesn't know
  // the real 3D path beyond it either, but "straight along -Y" is the
  // channel's own direction, not Z). Fixed by building the ring with its
  // bore along Y instead, so the cable passes straight through it in the
  // same direction it travels through the channel.
  //
  // *** FIX for PR #48 review round 3 (blocking, "slot opens the wrong
  // way") ***
  // The slot used to be cut along pre-rotation -X, which rotate([90,0,0])
  // (rotation about the X axis) leaves unchanged -- so after the Y-bore
  // fix above, the slot still opened sideways (-X) while the channel's
  // own groove opens upward (+Z, see channel()'s "open at the boss's top
  // face"). A cable can't travel from the groove into the clip without a
  // 90-degree kink if the two don't open the same way. rotate([90,0,0])
  // maps a pre-rotation point (x,y,z) to (x,-z,y), so a slot that opens
  // along pre-rotation +Y lands on post-rotation +Z. Cut that way below
  // instead, so the slot opens the same direction as the groove.
  module strain_relief_clip() {
    // *** FIX for PR #48 review round 3 (blocking, "wall thickness
    // silently cut via LIP_WIDTH coupling") ***
    // Was `clip_id + 2 * lip_width`, coupling this ring's wall to the
    // mount lip's width. Uses its own STRAIN_RELIEF_CLIP_WALL constant
    // now (see the constant's own comment above for why).
    outer_d = clip_id + 2 * STRAIN_RELIEF_CLIP_WALL;
    // Built with the bore along Z first (easiest to reason about radii
    // and the slot cut), then rotated 90 degrees about X so the bore ends
    // up along Y. rotate([90,0,0]) maps a Z-axis bore to a Y-axis bore;
    // the slot's "full height along Z" (pre-rotation) becomes "full
    // length along Y" (post-rotation), which is what a snap-in slot
    // running the clip's whole length should do.
    rotate([90, 0, 0])
      translate([0, 0, -clip_height / 2])
        difference() {
          cylinder(h = clip_height, d = outer_d, $fn = 32);
          translate([0, 0, -0.1])
            cylinder(h = clip_height + 0.2, d = clip_id, $fn = 32);
          // Narrow snap-in slot from the bore out through the outer edge,
          // on one side only, running the full length of the clip. Cut
          // along pre-rotation +Y (not +/-X) so it opens along +Z after
          // the rotate([90,0,0]) above -- see the fix note at this
          // module's top.
          translate([-STRAIN_RELIEF_CLIP_SLOT_WIDTH / 2, -0.1, -0.1])
            cube([STRAIN_RELIEF_CLIP_SLOT_WIDTH, outer_d / 2 + 0.2, clip_height + 0.2]);
        }
  }

  // Positioned right at the channel's far (-Y) end, extending clip_height
  // further in -Y (so it doesn't overlap the channel boss), with its bore
  // centered at the groove's own height (channel_groove_z) rather than
  // stacked on top of the boss -- see channel_groove_z above.
  translate([channel_exit_x, -channel_length - clip_height / 2, channel_groove_z])
    color("DimGray") strain_relief_clip();

  // *** FIX for PR #48 review round 3 (blocking, "clip floats off the
  // wall") ***
  // After the round-2 re-centring on the groove axis, the ring (outer
  // radius = (clip_id + 2*STRAIN_RELIEF_CLIP_WALL)/2 = 1.6mm, centered at
  // z = channel_groove_z = 2.0mm) spans z = 0.4 to 3.6 -- 0.4mm clear of
  // the wall surface at z=0, with its only attachment a face shared with
  // the channel boss's own end. Not structurally sound on its own.
  //
  // Adds two legs from the wall surface (z=0) up into the ring's own
  // solid wall material, one on each side of the bore -- NOT a single
  // block spanning the full width, which would plug part of the cable's
  // own through-bore (clip_id-diameter hole) where it dips below
  // channel_groove_z. Each leg sits at |x_local| in
  // [clip_id/2, clip_id/2 + STRAIN_RELIEF_CLIP_WALL], i.e. exactly the
  // ring's own annulus width, outside both the bore (radius clip_id/2)
  // and the snap-in slot (|x_local| < STRAIN_RELIEF_CLIP_SLOT_WIDTH/2,
  // well inside the bore radius) -- so it only ever adds material where
  // the ring is already solid, reaching a bit past the ring's own center
  // height (see leg_z below) for real volumetric overlap, not just a
  // touching edge.
  clip_bore_r = clip_id / 2;                             // 0.8mm
  clip_outer_r = clip_id / 2 + STRAIN_RELIEF_CLIP_WALL;  // 1.6mm, = outer_d/2 above
  leg_width = clip_outer_r - clip_bore_r;                // 0.8mm
  leg_y = -channel_length - clip_height;                 // matches the ring's own Y-span
  // Up to slightly past the ring's own center height (channel_groove_z),
  // not stopping exactly at it: at the leg's inner edge (x_local =
  // clip_bore_r, right at the bore boundary) the ring's solid annulus
  // only starts a bit past the center height on that boundary line, so
  // stopping the leg exactly at channel_groove_z would touch the ring
  // there along a knife-edge instead of a real overlapping volume. The
  // margin below gives real overlap depth even at that worst-case edge.
  leg_z = channel_groove_z + 0.5;

  translate([channel_exit_x + clip_bore_r, leg_y, 0])
    color("DimGray") cube([leg_width, clip_height, leg_z]);
  translate([channel_exit_x - clip_outer_r, leg_y, 0])
    color("DimGray") cube([leg_width, clip_height, leg_z]);
}

// Self-contained preview assembly: places antenna_mount() at
// MOUNT_X_MIN/MOUNT_X_CENTER on a STAND-IN slab representing the top wall's
// local area, with the element + keepout reference shown in place, and a
// marker for U201's connector X-center plus the two sibling pinhole X
// positions so the resolved layout is visible in one render. The slab is
// explicitly NOT the real top wall (pilink-8hx.1/.2 own that) -- sized
// dynamically off MOUNT_X_MAX so it stays wide enough for whatever position
// the math above lands on, not a hardcoded guess.
module demo_assembly() {
  slab_length = MOUNT_X_MAX + 10; // mm, local preview only, not FACE_W -- 10mm margin past the mount's own right edge
  slab_depth = 16;  // mm, local preview only, not BODY_THICKNESS
  slab_thickness = WALL_THICKNESS;

  color("LightGray", 0.3)
    cube([slab_length, slab_depth, slab_thickness]);

  translate([MOUNT_X_MIN, slab_depth - MOUNT_LAND_WIDTH - 2, slab_thickness]) {
    antenna_mount();
    translate([ASSEMBLY_CLEARANCE, ASSEMBLY_CLEARANCE, 0])
      antenna_element_reference();
    translate([ASSEMBLY_CLEARANCE, ASSEMBLY_CLEARANCE, 0])
      antenna_keepout_reference();
  }

  // U201 U.FL connector X-center marker (short red peg dropping toward
  // where the PCB sits, well below this local slab). pilink-3ym: the
  // connector is on the BACK face of the board (assumed X), not in front
  // of this mount.
  //
  // *** FIX for PR #48 review item 7 (minor, fixed as low-cost) ***
  // The first version subtracted MOUNT_X_MIN from every marker's X position,
  // but antenna_mount() is translated by +MOUNT_X_MIN in this same slab
  // frame -- so every marker below was drawn MOUNT_X_MIN mm too far left
  // (e.g. SW101 at 44-3=41 instead of 44), in the one view meant to show
  // the real positions. These markers are already in the slab's own
  // face-local-X frame (the same frame antenna_mount() is translated into),
  // so they need no extra offset.
  translate([U201_ANTENNA_FACE_X_CENTER, 0, 0])
    color("Red") cylinder(h = 0.5, d = 1.0, $fn = 12);

  // SW101/SW102 pinhole X markers (pilink-8hx.2's geometry, not drawn here
  // -- just the X position, to make the now-resolved clearance visible).
  translate([SW101_X_FACE_LOCAL, slab_depth, 0])
    color("Blue") cylinder(h = 0.5, d = 1.0, $fn = 12);
  translate([SW102_X_FACE_LOCAL, slab_depth, 0])
    color("Blue") cylinder(h = 0.5, d = 1.0, $fn = 12);
}

demo_assembly();
